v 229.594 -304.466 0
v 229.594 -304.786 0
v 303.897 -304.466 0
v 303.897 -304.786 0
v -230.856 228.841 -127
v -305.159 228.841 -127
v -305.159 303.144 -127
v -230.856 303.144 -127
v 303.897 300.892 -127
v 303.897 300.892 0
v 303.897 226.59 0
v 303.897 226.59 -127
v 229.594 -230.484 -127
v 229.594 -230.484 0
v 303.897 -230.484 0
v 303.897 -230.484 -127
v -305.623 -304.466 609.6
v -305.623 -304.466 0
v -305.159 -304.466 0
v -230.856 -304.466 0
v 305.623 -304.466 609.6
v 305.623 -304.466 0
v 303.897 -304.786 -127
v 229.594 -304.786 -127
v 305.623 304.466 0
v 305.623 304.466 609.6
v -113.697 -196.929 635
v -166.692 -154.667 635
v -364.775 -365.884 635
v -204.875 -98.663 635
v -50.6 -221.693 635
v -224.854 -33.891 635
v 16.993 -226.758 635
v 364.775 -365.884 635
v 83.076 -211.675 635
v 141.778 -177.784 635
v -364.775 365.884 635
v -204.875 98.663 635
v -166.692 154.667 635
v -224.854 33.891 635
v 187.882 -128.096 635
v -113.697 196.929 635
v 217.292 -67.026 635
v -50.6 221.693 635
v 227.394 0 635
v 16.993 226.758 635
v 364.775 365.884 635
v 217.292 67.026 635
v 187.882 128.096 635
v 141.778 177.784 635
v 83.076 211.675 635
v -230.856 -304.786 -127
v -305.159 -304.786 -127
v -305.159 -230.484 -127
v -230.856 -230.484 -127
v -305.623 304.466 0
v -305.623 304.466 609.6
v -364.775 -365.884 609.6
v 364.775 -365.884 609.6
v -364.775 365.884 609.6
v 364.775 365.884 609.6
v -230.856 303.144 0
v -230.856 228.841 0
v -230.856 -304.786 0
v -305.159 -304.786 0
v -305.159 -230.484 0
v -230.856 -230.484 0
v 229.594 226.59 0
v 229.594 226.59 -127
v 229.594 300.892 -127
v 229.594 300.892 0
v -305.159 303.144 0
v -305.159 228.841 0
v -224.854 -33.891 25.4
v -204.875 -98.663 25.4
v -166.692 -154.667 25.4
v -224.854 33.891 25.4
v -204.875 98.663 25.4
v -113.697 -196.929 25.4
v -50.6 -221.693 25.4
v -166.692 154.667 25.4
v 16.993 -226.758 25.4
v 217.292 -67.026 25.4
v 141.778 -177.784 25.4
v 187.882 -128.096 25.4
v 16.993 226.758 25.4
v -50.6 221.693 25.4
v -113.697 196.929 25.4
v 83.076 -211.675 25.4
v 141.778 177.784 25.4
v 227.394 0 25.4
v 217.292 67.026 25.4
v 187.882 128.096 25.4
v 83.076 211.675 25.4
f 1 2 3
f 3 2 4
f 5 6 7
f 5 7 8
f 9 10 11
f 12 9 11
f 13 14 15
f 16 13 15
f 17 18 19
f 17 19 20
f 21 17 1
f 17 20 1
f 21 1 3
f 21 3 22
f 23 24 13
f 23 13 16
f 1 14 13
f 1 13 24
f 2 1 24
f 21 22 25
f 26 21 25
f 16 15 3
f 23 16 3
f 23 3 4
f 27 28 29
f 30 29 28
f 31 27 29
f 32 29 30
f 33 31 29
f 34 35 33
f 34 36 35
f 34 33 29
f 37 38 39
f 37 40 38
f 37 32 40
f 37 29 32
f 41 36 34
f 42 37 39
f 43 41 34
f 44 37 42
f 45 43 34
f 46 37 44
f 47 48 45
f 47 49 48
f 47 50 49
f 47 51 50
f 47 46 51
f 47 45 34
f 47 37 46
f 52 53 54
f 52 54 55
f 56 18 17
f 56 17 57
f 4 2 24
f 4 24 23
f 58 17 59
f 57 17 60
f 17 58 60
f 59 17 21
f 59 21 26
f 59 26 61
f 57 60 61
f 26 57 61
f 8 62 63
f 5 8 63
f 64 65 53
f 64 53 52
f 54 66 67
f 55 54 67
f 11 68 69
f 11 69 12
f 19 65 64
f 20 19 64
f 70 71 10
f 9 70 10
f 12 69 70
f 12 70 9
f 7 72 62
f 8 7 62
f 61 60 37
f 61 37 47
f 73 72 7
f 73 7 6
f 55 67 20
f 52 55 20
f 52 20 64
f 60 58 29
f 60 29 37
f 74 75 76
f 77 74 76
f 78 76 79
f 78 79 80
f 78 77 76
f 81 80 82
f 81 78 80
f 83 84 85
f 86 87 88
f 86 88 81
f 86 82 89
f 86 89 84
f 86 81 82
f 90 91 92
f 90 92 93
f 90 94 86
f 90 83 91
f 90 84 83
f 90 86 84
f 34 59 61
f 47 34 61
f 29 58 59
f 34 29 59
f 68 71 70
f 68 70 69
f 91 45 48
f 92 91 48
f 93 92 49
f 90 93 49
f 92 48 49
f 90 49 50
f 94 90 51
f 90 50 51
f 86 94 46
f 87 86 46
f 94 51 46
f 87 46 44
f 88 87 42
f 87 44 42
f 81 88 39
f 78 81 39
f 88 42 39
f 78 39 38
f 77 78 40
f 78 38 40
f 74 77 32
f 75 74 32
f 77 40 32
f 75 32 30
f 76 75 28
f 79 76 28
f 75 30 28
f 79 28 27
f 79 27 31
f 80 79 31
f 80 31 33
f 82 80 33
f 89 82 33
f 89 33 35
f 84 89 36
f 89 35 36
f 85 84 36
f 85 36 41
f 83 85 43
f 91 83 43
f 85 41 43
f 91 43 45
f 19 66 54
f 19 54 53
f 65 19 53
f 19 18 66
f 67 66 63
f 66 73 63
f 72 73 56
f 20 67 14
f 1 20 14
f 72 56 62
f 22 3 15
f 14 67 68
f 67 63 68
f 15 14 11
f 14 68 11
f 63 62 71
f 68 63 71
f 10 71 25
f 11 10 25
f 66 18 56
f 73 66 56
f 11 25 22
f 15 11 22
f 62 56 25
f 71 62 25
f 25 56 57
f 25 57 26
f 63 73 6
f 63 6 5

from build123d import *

# Parameters (mm, degrees)
F0_W      = 611.245334
F0_H      = 608.932316
F1_DEPTH  = 609.6
F3_W      = 729.550778
F3_H      = 731.767536
F4_DEPTH  = 25.4
F6_R      = 227.394025
F7_DEPTH  = 609.6
F9_W      = 74.302555
F9_H      = 74.302554
F9_W_2    = 74.302539
F9_H_2    = 74.302539
F10_DEPTH = 127


with BuildPart() as f1:
    # F0 (on Top) → F1 (new body)
    with BuildSketch(Plane.XY):
        Rectangle(F0_W, F0_H)
    extrude(amount=F1_DEPTH)

    # F3 (on offset) → F4 (join)
    with BuildSketch(Plane.XY.offset(609.6)):
        Rectangle(F3_W, F3_H)
    extrude(amount=F4_DEPTH)

    # F6 (on offset) → F7 (cut)
    with BuildSketch(Plane.XY.offset(635)):
        Circle(F6_R)
    extrude(amount=-F7_DEPTH, mode=Mode.SUBTRACT)

    # F9 (on offset) → F10 (join)
    with BuildSketch(Plane(origin=(0, 0, 0), x_dir=(1, 0, 0), z_dir=(0, 0, -1))):
        with Locations((-268.007428, 267.634988)):
            Rectangle(F9_W, F9_H)
        with Locations((266.745753, 267.634988)):
            Rectangle(F9_W_2, F9_H)
        with Locations((266.745753, -263.740815)):
            Rectangle(F9_W_2, F9_H_2)
        with Locations((-268.007428, -265.992411)):
            Rectangle(F9_W, F9_H_2)
    extrude(amount=F10_DEPTH)


solid = f1.part
